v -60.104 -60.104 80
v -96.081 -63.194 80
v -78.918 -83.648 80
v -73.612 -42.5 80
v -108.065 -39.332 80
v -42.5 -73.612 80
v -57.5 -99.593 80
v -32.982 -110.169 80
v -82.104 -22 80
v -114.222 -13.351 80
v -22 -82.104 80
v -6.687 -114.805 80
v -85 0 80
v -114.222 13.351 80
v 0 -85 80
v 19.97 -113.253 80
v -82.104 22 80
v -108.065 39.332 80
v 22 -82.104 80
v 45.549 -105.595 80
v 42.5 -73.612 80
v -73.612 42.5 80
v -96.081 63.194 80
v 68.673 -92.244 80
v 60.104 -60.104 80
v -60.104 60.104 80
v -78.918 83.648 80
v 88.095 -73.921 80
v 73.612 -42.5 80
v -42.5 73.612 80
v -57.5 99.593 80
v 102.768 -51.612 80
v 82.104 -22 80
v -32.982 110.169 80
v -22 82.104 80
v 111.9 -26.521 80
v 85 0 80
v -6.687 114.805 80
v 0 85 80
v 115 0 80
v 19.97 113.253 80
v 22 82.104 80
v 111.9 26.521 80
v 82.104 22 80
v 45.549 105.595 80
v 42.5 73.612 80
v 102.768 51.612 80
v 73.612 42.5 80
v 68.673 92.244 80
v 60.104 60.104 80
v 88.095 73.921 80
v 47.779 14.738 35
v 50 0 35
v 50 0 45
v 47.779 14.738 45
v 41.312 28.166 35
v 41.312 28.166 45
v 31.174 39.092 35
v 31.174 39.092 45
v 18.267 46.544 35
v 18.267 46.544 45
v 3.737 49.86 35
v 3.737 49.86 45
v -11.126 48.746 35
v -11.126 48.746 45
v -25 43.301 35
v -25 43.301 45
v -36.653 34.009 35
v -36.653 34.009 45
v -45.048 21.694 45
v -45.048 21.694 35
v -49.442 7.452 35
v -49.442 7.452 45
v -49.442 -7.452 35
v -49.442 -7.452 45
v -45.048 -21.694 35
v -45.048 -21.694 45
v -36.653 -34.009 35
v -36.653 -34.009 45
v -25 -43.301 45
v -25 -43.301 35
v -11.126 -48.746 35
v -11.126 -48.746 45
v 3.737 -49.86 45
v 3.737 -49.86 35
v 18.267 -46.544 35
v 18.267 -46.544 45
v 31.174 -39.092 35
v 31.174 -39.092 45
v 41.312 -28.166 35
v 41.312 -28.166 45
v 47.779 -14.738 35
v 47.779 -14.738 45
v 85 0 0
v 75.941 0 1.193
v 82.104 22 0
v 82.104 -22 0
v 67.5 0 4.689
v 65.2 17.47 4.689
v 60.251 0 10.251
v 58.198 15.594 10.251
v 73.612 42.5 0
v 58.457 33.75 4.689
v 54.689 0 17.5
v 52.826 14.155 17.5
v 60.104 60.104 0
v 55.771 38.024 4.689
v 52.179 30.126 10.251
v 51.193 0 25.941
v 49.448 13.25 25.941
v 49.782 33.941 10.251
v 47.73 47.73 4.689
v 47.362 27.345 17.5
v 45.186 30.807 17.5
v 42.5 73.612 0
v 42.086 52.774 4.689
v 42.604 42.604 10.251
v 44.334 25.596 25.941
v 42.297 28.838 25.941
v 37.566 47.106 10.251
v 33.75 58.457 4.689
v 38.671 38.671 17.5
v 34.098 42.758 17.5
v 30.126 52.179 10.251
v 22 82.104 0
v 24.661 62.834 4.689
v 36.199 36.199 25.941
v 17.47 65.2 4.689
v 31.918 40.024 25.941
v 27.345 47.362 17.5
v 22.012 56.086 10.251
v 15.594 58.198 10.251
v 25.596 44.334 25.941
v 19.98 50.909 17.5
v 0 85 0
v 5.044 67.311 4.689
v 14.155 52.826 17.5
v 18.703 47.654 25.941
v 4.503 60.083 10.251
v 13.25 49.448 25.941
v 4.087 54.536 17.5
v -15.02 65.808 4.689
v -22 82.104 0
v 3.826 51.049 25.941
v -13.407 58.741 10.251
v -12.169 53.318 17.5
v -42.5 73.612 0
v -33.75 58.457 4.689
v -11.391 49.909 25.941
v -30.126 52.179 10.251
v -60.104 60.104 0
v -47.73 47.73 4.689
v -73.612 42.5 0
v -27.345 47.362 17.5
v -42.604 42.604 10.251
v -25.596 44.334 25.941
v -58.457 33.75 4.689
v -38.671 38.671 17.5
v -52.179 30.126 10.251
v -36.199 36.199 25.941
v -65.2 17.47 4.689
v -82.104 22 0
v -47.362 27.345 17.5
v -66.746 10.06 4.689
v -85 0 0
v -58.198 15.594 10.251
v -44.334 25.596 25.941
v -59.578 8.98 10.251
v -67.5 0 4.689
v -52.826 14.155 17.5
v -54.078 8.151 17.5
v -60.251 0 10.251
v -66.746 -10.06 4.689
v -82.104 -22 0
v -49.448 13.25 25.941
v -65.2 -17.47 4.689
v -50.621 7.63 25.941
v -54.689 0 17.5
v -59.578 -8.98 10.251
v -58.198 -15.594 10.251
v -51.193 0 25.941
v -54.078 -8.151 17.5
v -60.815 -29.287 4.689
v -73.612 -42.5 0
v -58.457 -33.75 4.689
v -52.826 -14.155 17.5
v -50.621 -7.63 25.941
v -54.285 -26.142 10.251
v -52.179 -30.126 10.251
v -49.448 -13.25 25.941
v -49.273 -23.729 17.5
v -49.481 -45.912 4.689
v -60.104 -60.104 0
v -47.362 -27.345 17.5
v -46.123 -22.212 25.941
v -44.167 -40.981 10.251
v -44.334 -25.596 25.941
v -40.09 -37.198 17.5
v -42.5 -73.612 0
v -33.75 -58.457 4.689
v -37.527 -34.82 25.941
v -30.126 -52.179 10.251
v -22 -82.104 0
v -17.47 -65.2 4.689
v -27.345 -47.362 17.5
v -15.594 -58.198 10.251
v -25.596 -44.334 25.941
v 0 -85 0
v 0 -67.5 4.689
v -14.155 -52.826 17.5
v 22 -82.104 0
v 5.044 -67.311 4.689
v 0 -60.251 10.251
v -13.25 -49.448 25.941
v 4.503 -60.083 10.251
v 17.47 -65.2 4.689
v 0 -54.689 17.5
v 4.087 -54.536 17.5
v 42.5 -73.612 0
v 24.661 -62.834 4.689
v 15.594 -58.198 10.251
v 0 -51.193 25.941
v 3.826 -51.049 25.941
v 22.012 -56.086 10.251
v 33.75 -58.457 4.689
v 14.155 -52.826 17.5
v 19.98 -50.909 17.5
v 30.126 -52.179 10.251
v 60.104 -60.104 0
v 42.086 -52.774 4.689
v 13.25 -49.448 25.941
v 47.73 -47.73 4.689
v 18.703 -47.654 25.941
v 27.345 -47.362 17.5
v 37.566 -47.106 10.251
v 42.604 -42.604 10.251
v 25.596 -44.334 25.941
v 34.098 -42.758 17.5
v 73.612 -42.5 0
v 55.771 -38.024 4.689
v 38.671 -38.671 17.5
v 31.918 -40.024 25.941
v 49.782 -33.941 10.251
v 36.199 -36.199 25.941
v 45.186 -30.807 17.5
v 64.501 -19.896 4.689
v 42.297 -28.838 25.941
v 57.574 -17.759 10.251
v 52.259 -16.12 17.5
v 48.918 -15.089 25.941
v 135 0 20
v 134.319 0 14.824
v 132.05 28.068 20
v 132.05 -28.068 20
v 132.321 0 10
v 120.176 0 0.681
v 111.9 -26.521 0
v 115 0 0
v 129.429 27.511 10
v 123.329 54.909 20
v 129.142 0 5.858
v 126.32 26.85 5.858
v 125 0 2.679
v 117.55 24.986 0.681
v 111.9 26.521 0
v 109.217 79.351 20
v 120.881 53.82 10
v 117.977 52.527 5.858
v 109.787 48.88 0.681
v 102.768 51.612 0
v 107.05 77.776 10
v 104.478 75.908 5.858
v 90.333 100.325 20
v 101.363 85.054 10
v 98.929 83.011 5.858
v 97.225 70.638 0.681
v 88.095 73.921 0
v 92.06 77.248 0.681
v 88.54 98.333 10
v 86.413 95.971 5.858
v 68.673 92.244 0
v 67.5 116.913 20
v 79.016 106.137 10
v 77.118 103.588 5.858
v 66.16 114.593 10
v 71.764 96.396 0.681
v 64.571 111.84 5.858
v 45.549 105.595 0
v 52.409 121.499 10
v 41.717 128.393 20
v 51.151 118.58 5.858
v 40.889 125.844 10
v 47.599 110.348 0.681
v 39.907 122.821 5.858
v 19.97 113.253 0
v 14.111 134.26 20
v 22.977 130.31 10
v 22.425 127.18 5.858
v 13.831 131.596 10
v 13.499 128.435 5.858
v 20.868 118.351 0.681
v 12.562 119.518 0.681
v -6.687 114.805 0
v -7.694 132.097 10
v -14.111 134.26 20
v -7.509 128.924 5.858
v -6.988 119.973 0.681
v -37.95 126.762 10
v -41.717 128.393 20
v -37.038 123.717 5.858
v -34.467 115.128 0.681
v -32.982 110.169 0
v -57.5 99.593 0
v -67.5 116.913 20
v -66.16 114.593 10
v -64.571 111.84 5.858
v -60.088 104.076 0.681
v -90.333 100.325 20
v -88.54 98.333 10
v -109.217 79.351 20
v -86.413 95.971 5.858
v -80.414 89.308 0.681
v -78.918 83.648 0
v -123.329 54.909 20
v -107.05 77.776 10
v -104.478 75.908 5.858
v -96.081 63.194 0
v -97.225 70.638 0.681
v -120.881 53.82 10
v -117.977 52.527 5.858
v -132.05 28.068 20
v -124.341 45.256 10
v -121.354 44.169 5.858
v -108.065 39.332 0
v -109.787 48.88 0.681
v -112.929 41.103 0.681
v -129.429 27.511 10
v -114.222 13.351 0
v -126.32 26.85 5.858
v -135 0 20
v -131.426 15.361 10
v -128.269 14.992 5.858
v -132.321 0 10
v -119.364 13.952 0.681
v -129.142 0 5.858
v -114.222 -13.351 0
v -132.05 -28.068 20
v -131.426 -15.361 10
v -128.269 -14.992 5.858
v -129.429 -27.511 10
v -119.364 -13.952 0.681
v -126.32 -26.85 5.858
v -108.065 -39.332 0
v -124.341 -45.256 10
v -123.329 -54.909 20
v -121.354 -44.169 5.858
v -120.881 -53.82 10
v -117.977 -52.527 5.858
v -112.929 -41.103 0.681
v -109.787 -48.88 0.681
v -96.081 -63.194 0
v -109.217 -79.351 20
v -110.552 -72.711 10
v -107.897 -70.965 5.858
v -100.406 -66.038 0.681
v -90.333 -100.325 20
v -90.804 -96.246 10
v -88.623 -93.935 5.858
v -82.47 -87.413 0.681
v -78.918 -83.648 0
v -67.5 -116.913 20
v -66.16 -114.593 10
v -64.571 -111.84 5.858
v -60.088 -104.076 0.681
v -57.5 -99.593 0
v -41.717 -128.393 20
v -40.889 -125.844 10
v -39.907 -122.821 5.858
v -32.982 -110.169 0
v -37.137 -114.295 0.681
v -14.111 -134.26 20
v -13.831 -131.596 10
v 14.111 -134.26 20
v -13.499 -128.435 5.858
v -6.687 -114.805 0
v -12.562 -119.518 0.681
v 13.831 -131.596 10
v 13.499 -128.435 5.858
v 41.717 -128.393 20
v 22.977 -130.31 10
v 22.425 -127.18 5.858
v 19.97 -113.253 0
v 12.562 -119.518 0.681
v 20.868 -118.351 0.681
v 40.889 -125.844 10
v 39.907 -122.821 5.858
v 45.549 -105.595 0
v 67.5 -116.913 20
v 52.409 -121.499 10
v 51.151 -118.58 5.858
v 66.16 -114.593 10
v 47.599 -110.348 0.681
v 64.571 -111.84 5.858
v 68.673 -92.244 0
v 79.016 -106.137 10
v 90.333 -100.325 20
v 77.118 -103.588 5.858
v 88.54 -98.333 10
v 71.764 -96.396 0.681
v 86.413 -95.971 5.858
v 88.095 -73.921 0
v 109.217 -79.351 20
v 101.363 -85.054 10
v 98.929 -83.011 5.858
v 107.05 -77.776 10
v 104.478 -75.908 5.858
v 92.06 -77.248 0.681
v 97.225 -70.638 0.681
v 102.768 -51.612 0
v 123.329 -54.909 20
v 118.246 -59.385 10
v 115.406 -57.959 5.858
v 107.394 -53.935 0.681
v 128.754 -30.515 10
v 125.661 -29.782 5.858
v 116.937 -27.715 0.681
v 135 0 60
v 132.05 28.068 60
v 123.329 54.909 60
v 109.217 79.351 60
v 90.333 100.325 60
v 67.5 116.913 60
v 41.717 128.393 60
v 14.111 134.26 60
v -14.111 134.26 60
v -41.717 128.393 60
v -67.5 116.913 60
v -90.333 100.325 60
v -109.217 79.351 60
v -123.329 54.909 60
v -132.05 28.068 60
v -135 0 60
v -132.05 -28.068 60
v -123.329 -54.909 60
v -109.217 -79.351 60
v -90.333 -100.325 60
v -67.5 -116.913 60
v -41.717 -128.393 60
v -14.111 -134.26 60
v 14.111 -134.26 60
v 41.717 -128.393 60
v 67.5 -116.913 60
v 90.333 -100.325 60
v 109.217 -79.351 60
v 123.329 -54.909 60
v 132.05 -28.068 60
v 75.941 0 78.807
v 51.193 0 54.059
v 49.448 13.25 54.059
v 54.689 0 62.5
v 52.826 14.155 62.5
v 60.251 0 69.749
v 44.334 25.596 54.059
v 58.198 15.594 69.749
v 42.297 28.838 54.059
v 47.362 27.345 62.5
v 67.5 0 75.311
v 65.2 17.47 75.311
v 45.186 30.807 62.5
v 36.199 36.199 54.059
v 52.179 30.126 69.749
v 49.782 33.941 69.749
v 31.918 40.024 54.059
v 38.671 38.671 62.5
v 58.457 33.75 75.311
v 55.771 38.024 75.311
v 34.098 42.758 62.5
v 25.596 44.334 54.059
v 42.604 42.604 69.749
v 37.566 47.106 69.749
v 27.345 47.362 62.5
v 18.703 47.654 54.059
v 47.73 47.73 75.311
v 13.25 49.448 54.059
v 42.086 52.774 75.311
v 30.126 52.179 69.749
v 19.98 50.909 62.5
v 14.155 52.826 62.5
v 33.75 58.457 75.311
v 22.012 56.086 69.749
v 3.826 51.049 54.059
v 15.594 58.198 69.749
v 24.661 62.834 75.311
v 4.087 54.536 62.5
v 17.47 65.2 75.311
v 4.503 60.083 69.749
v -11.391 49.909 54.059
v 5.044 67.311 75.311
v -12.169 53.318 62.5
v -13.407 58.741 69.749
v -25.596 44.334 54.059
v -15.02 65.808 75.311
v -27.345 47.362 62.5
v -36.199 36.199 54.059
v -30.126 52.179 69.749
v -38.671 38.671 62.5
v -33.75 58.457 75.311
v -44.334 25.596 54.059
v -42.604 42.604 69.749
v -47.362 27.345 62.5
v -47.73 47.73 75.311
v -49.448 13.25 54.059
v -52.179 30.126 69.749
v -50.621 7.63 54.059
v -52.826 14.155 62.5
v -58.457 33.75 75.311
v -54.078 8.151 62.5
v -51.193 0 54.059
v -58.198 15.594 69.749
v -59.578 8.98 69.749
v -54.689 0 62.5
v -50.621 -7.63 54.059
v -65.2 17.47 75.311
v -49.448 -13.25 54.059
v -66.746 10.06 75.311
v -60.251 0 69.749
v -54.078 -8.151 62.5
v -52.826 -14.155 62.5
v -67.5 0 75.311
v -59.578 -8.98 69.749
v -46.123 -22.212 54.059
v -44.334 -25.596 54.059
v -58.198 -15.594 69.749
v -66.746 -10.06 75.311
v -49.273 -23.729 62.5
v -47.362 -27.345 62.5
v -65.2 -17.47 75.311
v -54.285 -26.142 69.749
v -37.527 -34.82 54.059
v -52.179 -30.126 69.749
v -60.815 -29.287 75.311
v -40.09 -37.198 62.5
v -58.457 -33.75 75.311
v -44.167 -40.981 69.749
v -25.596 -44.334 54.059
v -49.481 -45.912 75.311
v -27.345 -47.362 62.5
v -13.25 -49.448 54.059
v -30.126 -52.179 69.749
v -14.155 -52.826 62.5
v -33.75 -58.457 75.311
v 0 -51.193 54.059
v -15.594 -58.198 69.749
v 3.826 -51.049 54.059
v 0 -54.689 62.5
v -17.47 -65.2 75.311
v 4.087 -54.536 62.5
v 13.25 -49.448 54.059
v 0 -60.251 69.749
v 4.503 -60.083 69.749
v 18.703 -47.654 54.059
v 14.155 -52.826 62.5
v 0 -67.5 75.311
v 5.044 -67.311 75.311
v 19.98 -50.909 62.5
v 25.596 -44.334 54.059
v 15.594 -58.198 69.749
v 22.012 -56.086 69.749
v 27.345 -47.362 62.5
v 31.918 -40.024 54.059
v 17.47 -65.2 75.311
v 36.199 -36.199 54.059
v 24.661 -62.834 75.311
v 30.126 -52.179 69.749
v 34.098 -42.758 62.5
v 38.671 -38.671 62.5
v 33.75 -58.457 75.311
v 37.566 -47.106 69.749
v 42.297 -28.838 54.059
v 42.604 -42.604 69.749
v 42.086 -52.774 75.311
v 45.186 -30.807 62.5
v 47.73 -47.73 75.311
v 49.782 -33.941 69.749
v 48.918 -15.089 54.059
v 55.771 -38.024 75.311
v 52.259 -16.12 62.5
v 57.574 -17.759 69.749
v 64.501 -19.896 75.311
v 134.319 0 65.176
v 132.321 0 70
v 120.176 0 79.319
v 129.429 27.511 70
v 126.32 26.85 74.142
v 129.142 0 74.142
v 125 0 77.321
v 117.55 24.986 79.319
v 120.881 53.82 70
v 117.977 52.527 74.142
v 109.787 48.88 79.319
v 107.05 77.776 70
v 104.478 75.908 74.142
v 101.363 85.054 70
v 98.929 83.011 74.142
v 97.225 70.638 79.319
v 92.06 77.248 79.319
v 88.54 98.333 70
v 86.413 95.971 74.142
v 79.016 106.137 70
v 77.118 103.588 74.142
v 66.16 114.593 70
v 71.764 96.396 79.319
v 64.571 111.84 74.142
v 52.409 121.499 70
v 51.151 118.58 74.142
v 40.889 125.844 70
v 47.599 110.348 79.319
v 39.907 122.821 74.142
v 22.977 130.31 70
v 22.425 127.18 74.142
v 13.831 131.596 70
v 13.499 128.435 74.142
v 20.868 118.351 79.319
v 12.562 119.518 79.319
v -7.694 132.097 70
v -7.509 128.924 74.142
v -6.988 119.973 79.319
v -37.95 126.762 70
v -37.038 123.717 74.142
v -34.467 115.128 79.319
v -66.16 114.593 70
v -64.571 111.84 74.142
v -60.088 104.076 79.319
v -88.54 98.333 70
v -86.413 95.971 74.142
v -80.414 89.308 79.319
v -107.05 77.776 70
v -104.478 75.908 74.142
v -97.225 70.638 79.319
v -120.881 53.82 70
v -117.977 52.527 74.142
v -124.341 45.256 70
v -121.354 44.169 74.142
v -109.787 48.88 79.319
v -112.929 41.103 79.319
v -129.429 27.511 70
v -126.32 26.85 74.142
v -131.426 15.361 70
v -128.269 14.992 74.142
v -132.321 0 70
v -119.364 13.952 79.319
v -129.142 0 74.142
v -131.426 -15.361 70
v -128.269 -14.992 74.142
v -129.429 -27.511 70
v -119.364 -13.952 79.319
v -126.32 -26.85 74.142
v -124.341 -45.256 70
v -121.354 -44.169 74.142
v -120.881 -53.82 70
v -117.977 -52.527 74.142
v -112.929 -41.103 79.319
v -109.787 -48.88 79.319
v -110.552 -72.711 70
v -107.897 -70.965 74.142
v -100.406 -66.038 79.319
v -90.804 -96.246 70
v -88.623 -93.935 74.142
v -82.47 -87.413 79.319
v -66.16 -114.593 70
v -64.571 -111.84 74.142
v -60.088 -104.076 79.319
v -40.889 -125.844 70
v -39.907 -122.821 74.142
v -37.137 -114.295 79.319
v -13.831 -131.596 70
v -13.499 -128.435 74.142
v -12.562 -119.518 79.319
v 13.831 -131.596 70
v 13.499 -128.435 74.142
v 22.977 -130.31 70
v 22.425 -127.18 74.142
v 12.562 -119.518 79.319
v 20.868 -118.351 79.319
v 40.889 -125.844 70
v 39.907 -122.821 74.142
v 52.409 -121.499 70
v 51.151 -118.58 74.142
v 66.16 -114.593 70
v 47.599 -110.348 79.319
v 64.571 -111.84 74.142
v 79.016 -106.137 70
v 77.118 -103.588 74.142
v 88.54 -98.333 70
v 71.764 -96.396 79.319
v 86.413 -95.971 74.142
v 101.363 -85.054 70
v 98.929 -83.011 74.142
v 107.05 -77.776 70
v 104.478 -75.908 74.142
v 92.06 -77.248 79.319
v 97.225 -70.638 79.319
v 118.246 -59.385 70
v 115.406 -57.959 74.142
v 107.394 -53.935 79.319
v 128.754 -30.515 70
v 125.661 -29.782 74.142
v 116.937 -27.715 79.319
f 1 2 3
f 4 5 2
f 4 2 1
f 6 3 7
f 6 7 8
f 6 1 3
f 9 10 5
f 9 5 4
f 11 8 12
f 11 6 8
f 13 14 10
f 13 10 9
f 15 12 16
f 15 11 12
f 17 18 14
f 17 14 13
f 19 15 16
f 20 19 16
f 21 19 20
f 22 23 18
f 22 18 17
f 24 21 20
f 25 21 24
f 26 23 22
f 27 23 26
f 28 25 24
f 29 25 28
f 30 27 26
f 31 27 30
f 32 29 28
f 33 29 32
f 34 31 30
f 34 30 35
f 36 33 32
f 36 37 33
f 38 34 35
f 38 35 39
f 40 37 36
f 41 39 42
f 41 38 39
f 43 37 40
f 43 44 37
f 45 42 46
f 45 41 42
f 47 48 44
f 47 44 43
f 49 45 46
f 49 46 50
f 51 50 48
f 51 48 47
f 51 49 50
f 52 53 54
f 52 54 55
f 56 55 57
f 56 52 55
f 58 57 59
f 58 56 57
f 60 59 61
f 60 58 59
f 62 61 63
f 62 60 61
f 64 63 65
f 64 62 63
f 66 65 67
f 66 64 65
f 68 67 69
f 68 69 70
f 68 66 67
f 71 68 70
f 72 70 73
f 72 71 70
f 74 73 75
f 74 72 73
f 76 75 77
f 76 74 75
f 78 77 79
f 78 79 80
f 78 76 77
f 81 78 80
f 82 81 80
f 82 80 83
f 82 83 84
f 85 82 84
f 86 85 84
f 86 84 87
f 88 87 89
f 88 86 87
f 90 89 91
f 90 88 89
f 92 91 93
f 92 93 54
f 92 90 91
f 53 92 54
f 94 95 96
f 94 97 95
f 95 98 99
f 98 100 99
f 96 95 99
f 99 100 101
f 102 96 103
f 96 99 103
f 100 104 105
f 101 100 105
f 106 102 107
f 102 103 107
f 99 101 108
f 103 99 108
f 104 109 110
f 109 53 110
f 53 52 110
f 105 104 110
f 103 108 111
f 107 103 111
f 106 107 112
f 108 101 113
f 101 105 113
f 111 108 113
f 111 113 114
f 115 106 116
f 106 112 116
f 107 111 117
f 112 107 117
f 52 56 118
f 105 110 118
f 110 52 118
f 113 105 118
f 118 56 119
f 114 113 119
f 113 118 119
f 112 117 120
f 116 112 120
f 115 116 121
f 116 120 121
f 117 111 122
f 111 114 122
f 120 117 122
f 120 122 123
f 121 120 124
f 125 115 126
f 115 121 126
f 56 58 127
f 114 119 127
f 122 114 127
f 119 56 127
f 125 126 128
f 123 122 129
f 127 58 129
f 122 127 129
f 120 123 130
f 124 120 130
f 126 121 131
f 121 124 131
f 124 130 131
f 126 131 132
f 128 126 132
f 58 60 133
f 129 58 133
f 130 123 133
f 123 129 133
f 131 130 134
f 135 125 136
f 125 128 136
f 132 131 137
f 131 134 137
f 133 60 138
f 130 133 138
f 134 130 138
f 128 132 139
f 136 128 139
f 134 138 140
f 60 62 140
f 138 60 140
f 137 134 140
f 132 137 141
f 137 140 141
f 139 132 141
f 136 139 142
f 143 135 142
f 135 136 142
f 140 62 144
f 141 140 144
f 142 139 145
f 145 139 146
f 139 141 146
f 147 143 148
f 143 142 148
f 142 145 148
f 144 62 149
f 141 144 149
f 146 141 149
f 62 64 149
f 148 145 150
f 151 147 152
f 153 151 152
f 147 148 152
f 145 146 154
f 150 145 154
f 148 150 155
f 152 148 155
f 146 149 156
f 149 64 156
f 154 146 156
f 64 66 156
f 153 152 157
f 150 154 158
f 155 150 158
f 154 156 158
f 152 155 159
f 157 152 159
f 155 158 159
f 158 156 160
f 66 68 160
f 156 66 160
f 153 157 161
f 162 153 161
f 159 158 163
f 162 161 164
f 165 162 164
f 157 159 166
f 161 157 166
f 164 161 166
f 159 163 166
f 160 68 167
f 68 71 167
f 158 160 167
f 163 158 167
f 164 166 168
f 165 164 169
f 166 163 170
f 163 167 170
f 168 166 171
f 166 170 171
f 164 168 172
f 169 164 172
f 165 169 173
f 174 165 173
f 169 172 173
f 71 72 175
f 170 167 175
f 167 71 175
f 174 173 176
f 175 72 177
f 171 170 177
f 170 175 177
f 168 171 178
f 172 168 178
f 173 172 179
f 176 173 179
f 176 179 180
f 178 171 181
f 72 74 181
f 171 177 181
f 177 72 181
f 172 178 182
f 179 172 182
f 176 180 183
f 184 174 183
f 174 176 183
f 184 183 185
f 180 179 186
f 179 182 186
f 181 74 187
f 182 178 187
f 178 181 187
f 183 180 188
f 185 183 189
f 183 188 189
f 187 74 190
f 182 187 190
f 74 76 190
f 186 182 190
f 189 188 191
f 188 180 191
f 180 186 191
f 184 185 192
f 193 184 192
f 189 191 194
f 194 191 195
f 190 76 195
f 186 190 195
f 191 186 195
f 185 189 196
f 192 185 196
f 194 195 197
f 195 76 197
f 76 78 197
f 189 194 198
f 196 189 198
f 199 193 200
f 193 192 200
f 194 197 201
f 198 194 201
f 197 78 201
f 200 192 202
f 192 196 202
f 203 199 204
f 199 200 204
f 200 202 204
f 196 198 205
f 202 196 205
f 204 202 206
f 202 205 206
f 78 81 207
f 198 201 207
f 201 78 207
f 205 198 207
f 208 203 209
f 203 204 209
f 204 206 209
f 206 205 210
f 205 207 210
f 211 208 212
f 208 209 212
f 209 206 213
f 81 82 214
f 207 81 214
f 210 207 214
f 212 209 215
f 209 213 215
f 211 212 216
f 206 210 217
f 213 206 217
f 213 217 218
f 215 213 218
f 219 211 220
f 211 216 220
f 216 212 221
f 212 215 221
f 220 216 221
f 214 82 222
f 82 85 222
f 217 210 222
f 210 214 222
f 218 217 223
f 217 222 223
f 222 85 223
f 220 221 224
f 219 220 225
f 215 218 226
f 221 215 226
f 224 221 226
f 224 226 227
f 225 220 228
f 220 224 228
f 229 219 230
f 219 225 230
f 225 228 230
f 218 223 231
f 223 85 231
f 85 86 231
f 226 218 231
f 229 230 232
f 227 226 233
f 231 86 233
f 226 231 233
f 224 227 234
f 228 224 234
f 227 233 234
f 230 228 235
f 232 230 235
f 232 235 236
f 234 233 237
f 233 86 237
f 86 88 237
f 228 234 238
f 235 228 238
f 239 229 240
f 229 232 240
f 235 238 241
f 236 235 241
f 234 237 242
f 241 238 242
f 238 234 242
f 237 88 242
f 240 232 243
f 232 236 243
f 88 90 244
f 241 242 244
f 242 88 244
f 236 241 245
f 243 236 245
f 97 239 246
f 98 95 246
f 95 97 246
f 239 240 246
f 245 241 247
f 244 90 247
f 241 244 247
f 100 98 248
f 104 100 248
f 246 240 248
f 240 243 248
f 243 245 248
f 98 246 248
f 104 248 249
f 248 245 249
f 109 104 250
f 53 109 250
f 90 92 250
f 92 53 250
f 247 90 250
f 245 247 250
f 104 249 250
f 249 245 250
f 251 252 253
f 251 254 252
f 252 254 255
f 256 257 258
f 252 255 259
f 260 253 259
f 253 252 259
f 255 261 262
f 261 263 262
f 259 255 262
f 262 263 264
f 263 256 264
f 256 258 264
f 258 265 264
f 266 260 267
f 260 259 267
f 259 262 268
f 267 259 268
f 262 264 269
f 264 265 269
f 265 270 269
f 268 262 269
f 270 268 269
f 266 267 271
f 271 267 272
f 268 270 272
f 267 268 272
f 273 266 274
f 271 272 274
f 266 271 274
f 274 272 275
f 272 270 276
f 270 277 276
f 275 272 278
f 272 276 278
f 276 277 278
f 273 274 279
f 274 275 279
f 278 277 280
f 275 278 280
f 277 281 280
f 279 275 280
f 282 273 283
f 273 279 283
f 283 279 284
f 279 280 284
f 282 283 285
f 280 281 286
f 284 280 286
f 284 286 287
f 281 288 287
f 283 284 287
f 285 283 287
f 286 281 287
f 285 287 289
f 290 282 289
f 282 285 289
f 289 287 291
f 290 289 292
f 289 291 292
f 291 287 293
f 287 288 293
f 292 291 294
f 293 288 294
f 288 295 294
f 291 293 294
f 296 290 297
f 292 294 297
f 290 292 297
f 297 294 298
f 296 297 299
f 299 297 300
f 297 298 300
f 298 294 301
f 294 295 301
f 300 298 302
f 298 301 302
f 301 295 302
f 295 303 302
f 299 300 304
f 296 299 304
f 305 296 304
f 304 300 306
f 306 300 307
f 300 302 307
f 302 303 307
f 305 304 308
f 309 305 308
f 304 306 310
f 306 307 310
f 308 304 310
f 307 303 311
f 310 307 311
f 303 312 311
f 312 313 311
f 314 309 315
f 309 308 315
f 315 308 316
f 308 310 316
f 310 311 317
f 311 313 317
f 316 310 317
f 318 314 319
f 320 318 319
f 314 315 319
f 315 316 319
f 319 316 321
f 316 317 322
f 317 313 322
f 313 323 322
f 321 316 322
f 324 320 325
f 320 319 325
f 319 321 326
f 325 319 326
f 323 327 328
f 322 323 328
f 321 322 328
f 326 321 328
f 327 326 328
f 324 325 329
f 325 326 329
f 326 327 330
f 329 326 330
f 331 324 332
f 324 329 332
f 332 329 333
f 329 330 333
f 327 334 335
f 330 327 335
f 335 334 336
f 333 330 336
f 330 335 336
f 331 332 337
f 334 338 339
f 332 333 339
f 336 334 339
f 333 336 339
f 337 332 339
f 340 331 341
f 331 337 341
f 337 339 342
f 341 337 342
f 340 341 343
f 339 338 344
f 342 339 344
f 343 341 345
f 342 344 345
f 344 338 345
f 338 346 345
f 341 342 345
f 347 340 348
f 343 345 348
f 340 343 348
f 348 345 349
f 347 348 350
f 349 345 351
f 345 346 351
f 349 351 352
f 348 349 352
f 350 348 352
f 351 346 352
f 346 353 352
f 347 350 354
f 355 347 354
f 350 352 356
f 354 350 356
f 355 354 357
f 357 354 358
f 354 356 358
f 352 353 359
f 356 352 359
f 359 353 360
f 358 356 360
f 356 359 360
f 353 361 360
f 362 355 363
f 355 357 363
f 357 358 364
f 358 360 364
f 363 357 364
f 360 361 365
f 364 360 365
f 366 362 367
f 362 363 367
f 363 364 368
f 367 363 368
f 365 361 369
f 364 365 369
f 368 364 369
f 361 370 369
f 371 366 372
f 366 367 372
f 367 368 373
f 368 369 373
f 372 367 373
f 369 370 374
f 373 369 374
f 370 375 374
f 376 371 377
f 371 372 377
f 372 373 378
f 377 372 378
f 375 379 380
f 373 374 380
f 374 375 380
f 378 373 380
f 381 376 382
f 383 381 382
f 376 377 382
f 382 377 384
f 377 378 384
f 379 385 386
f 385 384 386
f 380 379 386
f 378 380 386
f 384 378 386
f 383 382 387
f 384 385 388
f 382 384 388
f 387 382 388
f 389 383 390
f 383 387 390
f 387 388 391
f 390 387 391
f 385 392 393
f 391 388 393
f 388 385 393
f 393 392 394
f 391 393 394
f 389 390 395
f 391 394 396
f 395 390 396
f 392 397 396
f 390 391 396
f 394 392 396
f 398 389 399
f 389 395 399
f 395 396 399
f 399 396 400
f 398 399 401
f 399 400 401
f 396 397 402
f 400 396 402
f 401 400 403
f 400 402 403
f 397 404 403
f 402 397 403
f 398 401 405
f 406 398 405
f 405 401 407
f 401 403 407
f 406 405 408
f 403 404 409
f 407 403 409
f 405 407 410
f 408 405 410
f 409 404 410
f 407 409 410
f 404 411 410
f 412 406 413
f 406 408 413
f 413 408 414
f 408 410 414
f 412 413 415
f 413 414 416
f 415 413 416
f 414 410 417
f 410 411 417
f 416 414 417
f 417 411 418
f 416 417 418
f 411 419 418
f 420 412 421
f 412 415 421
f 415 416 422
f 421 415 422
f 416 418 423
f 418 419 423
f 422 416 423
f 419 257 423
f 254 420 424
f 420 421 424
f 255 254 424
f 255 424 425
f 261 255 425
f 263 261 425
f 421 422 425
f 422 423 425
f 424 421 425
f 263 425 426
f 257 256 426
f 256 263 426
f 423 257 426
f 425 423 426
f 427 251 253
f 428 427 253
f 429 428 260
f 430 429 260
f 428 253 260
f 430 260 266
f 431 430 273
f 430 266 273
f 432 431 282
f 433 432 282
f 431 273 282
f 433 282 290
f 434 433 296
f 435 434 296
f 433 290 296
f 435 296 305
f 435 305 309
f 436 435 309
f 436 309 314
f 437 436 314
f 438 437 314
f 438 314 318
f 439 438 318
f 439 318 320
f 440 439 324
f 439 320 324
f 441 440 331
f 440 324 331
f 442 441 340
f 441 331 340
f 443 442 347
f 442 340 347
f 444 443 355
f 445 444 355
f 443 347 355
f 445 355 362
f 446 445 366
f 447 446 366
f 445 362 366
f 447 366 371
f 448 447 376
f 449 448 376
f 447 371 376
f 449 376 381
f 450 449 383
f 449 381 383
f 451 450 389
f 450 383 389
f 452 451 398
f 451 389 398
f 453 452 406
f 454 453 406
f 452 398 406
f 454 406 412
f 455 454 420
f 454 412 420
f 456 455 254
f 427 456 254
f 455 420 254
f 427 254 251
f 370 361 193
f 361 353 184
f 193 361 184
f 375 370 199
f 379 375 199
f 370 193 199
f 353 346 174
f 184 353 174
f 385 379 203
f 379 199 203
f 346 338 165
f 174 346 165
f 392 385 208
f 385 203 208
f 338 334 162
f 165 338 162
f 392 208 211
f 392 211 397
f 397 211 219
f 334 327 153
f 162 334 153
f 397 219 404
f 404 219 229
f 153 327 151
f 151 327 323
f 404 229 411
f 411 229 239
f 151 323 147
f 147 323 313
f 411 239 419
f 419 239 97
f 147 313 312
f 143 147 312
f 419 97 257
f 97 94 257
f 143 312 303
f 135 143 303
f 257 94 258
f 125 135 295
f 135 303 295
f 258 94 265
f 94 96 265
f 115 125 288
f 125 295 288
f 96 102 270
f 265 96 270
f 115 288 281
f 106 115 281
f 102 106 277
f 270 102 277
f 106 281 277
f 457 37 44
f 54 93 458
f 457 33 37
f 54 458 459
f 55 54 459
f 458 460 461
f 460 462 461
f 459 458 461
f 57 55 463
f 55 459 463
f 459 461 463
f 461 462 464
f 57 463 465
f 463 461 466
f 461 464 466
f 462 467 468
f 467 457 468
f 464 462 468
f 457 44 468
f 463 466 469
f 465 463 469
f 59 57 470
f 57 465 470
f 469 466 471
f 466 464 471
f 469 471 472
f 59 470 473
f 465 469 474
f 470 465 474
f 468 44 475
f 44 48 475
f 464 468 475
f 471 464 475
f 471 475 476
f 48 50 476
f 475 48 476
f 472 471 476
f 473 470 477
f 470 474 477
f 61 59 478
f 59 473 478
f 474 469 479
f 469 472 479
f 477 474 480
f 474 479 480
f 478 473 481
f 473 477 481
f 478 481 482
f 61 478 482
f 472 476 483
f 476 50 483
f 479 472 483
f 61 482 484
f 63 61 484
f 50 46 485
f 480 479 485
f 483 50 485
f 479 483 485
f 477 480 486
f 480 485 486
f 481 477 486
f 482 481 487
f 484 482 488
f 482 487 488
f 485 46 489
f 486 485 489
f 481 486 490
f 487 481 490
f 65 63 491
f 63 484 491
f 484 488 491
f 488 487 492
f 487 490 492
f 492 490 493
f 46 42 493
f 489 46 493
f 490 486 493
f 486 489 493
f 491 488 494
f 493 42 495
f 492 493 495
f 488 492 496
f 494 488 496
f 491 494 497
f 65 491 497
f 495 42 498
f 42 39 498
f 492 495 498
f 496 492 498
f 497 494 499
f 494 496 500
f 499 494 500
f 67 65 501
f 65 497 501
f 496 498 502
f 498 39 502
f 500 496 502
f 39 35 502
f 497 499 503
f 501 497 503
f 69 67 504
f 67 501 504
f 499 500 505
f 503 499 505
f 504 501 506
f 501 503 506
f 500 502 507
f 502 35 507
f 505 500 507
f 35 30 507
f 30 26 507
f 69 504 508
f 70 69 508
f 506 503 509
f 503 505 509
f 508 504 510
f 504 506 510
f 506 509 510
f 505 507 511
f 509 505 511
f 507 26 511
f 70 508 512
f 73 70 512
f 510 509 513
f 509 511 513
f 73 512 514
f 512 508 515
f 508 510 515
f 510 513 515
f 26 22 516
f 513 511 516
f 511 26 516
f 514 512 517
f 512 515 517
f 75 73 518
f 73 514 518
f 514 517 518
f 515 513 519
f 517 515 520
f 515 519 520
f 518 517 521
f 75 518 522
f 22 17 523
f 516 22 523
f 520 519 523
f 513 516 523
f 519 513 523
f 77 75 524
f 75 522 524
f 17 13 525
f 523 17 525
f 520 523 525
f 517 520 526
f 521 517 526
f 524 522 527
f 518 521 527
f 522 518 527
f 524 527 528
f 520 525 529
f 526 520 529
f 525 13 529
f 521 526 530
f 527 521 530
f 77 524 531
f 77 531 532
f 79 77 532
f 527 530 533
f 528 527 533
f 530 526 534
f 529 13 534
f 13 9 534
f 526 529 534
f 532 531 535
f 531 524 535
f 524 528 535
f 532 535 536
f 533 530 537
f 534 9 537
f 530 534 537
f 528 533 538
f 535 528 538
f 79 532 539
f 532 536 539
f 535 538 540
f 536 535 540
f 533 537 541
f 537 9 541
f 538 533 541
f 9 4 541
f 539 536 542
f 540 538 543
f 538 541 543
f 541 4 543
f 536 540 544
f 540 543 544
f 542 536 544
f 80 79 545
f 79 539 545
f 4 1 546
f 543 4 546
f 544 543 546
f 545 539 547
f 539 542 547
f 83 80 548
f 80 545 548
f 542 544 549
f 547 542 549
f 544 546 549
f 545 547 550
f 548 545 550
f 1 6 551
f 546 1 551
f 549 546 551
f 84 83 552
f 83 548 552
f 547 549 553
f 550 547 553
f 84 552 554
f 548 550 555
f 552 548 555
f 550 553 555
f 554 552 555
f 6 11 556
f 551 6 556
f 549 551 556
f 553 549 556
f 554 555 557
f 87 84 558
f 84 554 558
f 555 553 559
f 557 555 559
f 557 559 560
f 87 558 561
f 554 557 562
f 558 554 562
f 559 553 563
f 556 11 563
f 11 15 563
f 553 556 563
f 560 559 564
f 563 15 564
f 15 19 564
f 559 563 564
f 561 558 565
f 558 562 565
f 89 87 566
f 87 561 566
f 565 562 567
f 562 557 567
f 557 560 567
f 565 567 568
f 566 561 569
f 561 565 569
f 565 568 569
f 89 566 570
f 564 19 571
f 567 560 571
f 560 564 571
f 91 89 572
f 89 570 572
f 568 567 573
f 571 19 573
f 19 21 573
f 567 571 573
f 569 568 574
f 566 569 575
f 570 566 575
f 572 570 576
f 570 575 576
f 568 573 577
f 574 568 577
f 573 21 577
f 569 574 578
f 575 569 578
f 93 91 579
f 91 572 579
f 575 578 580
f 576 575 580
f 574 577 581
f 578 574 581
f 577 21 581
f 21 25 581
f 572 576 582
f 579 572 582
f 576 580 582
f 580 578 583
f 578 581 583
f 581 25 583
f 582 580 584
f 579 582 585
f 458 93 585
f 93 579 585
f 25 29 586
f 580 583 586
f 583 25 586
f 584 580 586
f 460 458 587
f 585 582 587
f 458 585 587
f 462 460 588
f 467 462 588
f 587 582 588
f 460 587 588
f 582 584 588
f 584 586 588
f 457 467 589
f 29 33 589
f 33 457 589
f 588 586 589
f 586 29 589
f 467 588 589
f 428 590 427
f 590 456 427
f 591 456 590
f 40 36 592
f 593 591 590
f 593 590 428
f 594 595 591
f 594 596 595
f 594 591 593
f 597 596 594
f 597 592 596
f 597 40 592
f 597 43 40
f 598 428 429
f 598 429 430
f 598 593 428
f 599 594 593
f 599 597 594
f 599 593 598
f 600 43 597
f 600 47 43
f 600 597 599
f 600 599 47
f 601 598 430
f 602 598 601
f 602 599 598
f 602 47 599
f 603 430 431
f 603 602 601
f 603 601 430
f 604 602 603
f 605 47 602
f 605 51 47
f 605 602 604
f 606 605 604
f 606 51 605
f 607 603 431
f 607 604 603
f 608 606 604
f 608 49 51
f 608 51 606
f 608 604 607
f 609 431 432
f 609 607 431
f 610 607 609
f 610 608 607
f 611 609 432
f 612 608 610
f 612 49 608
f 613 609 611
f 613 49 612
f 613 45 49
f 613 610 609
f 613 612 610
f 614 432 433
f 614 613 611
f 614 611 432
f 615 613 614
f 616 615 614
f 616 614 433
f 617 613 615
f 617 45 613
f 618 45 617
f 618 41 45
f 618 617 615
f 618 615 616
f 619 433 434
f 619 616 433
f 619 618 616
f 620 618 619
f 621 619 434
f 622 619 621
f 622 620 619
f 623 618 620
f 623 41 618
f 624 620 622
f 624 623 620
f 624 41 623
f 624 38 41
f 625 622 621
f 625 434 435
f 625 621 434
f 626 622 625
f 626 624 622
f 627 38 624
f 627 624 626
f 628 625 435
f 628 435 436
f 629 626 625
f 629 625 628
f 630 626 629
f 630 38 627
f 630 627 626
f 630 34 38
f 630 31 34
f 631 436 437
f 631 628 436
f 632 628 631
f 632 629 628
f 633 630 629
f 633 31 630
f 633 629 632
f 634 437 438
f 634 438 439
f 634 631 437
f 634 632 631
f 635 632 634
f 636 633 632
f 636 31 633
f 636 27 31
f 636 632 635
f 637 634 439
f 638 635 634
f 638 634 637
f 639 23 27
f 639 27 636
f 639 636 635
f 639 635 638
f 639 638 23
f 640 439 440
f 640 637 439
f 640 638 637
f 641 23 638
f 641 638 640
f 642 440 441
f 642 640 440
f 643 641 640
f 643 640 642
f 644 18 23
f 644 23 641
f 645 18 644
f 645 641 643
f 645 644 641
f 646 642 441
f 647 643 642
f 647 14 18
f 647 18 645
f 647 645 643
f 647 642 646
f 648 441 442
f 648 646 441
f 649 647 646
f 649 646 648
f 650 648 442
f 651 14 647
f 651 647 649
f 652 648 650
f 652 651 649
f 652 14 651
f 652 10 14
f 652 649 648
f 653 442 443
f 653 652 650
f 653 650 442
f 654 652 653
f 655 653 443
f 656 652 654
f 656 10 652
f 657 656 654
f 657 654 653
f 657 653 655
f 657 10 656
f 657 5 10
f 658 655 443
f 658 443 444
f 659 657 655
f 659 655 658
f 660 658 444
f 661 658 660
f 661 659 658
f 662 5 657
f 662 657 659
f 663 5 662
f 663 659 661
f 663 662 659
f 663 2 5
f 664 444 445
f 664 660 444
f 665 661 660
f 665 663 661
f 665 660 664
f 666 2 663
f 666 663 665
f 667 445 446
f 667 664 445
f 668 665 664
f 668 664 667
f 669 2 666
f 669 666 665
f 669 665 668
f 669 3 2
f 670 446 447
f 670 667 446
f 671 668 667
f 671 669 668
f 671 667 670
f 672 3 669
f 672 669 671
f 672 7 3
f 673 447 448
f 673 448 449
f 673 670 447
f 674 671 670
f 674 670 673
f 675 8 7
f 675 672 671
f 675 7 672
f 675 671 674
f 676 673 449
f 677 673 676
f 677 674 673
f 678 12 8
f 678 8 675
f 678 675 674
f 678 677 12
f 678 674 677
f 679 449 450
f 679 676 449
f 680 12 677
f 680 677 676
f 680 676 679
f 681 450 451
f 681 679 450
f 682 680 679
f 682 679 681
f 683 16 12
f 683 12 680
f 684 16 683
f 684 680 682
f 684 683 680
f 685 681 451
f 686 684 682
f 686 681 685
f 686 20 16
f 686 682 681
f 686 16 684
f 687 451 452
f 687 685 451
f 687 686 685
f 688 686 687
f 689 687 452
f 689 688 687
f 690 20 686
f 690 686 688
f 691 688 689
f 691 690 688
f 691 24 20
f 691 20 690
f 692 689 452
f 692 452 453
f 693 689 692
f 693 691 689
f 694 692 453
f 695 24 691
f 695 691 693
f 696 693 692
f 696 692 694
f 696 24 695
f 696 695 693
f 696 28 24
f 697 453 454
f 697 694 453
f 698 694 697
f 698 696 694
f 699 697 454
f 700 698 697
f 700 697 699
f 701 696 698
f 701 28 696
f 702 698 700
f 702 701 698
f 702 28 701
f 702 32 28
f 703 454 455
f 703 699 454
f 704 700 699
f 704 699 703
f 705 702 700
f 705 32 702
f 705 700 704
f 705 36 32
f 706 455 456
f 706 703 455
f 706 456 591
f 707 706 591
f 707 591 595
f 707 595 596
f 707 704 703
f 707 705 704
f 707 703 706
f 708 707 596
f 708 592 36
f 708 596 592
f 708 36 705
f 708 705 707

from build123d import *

# Parameters (mm, degrees)
SKETCH_1_R      = 135
SKETCH_1_R_2    = 50
EXTRUDE_1_DEPTH = 80
FILLET_4_R      = 20
FILLET_5_R      = 20
FILLET_6_R      = 35
FILLET_7_R      = 35


with BuildPart() as part:
    # Эскиз1 → Вытянуть1 (new body)
    with BuildSketch(Plane.XY):
        Circle(SKETCH_1_R)
        Circle(SKETCH_1_R_2, mode=Mode.SUBTRACT)
    extrude(amount=EXTRUDE_1_DEPTH)

    # Скругление4
    fillet_4_edges = [part.edges().sort_by_distance(p)[0] for p in [
        (-135, 0, 0),
    ]]
    fillet(fillet_4_edges, radius=FILLET_4_R)

    # Скругление5
    fillet_5_edges = [part.edges().sort_by_distance(p)[0] for p in [
        (-135, 0, 80),
    ]]
    fillet(fillet_5_edges, radius=FILLET_5_R)

    # Скругление6
    fillet_6_edges = [part.edges().sort_by_distance(p)[0] for p in [
        (-50, 0, 0),
    ]]
    fillet(fillet_6_edges, radius=FILLET_6_R)

    # Скругление7
    fillet_7_edges = [part.edges().sort_by_distance(p)[0] for p in [
        (-50, 0, 80),
    ]]
    fillet(fillet_7_edges, radius=FILLET_7_R)


solid = part.part
